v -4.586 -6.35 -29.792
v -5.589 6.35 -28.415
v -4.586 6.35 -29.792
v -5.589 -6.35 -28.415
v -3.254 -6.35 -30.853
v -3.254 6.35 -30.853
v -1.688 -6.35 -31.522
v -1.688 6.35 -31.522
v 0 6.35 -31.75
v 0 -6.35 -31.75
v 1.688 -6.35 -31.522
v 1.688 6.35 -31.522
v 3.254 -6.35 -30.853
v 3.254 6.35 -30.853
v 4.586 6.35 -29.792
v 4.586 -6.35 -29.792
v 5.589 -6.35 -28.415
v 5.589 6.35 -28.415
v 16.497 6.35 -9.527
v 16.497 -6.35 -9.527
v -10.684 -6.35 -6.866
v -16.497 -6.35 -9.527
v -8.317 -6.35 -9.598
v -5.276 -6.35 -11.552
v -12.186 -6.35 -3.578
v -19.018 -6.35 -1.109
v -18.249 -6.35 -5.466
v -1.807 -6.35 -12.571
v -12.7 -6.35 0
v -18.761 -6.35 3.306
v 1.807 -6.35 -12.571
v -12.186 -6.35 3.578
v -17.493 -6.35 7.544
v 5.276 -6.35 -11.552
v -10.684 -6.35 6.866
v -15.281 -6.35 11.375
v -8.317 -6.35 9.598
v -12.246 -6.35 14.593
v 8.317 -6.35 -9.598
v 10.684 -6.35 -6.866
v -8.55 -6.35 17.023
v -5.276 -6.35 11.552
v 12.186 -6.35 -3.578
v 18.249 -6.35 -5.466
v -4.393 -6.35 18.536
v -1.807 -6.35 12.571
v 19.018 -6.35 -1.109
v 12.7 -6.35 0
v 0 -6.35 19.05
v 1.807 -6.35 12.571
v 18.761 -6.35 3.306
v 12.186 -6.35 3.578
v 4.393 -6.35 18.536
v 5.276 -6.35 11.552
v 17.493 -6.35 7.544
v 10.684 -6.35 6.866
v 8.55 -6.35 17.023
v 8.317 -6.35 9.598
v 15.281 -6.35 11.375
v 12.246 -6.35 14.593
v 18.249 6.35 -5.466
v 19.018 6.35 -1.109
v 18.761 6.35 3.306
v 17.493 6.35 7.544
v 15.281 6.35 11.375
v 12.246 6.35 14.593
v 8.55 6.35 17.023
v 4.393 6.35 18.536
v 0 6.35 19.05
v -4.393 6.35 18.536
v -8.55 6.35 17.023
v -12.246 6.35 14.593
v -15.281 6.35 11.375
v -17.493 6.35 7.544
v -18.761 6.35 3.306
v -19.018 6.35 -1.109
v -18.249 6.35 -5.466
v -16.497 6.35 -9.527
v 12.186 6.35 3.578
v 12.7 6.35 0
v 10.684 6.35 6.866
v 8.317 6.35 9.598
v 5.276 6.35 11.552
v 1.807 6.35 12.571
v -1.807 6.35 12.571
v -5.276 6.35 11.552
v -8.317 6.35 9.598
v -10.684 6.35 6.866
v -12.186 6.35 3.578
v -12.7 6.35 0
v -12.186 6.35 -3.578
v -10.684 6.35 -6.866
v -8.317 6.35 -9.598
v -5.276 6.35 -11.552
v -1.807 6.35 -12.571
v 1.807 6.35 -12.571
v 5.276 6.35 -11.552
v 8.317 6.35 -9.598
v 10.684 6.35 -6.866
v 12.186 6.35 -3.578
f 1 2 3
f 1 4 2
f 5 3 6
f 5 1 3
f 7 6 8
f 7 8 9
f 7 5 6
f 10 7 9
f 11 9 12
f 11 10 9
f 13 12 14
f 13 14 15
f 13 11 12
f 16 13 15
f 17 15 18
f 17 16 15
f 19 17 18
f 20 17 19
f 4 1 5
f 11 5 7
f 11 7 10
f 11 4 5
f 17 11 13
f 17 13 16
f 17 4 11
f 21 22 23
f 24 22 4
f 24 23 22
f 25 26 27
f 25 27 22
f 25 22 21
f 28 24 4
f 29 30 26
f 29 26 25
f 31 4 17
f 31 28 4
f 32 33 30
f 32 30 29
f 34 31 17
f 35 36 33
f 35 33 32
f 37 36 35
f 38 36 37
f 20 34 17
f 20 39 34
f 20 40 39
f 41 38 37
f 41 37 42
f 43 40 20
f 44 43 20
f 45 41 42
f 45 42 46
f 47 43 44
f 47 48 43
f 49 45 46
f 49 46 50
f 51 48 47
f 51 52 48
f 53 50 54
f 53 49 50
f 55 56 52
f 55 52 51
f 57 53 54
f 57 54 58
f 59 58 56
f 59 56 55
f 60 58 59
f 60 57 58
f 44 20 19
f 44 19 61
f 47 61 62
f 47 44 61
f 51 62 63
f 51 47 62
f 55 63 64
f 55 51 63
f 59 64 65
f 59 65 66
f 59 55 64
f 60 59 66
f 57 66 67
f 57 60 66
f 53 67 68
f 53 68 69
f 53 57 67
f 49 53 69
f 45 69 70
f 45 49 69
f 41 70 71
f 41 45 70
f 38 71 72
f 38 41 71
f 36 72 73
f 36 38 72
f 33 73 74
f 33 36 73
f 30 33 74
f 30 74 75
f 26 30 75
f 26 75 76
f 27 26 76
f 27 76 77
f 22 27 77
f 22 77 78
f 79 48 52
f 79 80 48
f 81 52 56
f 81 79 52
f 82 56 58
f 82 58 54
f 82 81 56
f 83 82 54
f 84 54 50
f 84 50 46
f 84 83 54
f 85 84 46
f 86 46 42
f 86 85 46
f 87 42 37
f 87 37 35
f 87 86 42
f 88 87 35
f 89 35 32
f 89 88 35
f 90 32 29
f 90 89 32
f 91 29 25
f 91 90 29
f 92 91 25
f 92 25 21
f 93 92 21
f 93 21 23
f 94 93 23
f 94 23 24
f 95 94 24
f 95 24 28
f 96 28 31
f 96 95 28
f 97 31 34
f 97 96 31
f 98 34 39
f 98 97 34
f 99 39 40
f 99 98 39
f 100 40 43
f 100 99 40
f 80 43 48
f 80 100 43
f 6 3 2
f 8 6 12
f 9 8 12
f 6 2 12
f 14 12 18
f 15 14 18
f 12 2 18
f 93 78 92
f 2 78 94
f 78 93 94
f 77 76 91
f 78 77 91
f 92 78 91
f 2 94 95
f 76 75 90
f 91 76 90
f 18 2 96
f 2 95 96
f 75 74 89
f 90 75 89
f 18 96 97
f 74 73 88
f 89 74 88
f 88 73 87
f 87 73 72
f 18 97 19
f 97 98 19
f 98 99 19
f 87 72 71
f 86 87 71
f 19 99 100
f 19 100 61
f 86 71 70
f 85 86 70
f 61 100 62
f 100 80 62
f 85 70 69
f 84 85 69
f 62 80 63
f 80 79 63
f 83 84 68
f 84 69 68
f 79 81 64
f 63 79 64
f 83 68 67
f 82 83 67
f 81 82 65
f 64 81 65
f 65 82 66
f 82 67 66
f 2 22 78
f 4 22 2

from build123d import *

# Parameters (mm, degrees)
F0_R     = 12.7
F1_DEPTH = 6.35


with BuildPart() as f1:
    # F0 (on Front) → F1 (new body, symmetric)
    with BuildSketch(Plane.XZ):
        with BuildLine():
            Line((5.58851, -28.415137), (16.496631, -9.526996))
            ThreePointArc((16.496631, -9.526996), (0, 19.05), (-16.496631, -9.526996))
            Line((-16.496631, -9.526996), (-5.58851, -28.415137))
            ThreePointArc((-5.58851, -28.415137), (0, -31.75), (5.58851, -28.415137))
        make_face()
        Circle(F0_R, mode=Mode.SUBTRACT)
    extrude(amount=F1_DEPTH, both=True)


solid = f1.part
